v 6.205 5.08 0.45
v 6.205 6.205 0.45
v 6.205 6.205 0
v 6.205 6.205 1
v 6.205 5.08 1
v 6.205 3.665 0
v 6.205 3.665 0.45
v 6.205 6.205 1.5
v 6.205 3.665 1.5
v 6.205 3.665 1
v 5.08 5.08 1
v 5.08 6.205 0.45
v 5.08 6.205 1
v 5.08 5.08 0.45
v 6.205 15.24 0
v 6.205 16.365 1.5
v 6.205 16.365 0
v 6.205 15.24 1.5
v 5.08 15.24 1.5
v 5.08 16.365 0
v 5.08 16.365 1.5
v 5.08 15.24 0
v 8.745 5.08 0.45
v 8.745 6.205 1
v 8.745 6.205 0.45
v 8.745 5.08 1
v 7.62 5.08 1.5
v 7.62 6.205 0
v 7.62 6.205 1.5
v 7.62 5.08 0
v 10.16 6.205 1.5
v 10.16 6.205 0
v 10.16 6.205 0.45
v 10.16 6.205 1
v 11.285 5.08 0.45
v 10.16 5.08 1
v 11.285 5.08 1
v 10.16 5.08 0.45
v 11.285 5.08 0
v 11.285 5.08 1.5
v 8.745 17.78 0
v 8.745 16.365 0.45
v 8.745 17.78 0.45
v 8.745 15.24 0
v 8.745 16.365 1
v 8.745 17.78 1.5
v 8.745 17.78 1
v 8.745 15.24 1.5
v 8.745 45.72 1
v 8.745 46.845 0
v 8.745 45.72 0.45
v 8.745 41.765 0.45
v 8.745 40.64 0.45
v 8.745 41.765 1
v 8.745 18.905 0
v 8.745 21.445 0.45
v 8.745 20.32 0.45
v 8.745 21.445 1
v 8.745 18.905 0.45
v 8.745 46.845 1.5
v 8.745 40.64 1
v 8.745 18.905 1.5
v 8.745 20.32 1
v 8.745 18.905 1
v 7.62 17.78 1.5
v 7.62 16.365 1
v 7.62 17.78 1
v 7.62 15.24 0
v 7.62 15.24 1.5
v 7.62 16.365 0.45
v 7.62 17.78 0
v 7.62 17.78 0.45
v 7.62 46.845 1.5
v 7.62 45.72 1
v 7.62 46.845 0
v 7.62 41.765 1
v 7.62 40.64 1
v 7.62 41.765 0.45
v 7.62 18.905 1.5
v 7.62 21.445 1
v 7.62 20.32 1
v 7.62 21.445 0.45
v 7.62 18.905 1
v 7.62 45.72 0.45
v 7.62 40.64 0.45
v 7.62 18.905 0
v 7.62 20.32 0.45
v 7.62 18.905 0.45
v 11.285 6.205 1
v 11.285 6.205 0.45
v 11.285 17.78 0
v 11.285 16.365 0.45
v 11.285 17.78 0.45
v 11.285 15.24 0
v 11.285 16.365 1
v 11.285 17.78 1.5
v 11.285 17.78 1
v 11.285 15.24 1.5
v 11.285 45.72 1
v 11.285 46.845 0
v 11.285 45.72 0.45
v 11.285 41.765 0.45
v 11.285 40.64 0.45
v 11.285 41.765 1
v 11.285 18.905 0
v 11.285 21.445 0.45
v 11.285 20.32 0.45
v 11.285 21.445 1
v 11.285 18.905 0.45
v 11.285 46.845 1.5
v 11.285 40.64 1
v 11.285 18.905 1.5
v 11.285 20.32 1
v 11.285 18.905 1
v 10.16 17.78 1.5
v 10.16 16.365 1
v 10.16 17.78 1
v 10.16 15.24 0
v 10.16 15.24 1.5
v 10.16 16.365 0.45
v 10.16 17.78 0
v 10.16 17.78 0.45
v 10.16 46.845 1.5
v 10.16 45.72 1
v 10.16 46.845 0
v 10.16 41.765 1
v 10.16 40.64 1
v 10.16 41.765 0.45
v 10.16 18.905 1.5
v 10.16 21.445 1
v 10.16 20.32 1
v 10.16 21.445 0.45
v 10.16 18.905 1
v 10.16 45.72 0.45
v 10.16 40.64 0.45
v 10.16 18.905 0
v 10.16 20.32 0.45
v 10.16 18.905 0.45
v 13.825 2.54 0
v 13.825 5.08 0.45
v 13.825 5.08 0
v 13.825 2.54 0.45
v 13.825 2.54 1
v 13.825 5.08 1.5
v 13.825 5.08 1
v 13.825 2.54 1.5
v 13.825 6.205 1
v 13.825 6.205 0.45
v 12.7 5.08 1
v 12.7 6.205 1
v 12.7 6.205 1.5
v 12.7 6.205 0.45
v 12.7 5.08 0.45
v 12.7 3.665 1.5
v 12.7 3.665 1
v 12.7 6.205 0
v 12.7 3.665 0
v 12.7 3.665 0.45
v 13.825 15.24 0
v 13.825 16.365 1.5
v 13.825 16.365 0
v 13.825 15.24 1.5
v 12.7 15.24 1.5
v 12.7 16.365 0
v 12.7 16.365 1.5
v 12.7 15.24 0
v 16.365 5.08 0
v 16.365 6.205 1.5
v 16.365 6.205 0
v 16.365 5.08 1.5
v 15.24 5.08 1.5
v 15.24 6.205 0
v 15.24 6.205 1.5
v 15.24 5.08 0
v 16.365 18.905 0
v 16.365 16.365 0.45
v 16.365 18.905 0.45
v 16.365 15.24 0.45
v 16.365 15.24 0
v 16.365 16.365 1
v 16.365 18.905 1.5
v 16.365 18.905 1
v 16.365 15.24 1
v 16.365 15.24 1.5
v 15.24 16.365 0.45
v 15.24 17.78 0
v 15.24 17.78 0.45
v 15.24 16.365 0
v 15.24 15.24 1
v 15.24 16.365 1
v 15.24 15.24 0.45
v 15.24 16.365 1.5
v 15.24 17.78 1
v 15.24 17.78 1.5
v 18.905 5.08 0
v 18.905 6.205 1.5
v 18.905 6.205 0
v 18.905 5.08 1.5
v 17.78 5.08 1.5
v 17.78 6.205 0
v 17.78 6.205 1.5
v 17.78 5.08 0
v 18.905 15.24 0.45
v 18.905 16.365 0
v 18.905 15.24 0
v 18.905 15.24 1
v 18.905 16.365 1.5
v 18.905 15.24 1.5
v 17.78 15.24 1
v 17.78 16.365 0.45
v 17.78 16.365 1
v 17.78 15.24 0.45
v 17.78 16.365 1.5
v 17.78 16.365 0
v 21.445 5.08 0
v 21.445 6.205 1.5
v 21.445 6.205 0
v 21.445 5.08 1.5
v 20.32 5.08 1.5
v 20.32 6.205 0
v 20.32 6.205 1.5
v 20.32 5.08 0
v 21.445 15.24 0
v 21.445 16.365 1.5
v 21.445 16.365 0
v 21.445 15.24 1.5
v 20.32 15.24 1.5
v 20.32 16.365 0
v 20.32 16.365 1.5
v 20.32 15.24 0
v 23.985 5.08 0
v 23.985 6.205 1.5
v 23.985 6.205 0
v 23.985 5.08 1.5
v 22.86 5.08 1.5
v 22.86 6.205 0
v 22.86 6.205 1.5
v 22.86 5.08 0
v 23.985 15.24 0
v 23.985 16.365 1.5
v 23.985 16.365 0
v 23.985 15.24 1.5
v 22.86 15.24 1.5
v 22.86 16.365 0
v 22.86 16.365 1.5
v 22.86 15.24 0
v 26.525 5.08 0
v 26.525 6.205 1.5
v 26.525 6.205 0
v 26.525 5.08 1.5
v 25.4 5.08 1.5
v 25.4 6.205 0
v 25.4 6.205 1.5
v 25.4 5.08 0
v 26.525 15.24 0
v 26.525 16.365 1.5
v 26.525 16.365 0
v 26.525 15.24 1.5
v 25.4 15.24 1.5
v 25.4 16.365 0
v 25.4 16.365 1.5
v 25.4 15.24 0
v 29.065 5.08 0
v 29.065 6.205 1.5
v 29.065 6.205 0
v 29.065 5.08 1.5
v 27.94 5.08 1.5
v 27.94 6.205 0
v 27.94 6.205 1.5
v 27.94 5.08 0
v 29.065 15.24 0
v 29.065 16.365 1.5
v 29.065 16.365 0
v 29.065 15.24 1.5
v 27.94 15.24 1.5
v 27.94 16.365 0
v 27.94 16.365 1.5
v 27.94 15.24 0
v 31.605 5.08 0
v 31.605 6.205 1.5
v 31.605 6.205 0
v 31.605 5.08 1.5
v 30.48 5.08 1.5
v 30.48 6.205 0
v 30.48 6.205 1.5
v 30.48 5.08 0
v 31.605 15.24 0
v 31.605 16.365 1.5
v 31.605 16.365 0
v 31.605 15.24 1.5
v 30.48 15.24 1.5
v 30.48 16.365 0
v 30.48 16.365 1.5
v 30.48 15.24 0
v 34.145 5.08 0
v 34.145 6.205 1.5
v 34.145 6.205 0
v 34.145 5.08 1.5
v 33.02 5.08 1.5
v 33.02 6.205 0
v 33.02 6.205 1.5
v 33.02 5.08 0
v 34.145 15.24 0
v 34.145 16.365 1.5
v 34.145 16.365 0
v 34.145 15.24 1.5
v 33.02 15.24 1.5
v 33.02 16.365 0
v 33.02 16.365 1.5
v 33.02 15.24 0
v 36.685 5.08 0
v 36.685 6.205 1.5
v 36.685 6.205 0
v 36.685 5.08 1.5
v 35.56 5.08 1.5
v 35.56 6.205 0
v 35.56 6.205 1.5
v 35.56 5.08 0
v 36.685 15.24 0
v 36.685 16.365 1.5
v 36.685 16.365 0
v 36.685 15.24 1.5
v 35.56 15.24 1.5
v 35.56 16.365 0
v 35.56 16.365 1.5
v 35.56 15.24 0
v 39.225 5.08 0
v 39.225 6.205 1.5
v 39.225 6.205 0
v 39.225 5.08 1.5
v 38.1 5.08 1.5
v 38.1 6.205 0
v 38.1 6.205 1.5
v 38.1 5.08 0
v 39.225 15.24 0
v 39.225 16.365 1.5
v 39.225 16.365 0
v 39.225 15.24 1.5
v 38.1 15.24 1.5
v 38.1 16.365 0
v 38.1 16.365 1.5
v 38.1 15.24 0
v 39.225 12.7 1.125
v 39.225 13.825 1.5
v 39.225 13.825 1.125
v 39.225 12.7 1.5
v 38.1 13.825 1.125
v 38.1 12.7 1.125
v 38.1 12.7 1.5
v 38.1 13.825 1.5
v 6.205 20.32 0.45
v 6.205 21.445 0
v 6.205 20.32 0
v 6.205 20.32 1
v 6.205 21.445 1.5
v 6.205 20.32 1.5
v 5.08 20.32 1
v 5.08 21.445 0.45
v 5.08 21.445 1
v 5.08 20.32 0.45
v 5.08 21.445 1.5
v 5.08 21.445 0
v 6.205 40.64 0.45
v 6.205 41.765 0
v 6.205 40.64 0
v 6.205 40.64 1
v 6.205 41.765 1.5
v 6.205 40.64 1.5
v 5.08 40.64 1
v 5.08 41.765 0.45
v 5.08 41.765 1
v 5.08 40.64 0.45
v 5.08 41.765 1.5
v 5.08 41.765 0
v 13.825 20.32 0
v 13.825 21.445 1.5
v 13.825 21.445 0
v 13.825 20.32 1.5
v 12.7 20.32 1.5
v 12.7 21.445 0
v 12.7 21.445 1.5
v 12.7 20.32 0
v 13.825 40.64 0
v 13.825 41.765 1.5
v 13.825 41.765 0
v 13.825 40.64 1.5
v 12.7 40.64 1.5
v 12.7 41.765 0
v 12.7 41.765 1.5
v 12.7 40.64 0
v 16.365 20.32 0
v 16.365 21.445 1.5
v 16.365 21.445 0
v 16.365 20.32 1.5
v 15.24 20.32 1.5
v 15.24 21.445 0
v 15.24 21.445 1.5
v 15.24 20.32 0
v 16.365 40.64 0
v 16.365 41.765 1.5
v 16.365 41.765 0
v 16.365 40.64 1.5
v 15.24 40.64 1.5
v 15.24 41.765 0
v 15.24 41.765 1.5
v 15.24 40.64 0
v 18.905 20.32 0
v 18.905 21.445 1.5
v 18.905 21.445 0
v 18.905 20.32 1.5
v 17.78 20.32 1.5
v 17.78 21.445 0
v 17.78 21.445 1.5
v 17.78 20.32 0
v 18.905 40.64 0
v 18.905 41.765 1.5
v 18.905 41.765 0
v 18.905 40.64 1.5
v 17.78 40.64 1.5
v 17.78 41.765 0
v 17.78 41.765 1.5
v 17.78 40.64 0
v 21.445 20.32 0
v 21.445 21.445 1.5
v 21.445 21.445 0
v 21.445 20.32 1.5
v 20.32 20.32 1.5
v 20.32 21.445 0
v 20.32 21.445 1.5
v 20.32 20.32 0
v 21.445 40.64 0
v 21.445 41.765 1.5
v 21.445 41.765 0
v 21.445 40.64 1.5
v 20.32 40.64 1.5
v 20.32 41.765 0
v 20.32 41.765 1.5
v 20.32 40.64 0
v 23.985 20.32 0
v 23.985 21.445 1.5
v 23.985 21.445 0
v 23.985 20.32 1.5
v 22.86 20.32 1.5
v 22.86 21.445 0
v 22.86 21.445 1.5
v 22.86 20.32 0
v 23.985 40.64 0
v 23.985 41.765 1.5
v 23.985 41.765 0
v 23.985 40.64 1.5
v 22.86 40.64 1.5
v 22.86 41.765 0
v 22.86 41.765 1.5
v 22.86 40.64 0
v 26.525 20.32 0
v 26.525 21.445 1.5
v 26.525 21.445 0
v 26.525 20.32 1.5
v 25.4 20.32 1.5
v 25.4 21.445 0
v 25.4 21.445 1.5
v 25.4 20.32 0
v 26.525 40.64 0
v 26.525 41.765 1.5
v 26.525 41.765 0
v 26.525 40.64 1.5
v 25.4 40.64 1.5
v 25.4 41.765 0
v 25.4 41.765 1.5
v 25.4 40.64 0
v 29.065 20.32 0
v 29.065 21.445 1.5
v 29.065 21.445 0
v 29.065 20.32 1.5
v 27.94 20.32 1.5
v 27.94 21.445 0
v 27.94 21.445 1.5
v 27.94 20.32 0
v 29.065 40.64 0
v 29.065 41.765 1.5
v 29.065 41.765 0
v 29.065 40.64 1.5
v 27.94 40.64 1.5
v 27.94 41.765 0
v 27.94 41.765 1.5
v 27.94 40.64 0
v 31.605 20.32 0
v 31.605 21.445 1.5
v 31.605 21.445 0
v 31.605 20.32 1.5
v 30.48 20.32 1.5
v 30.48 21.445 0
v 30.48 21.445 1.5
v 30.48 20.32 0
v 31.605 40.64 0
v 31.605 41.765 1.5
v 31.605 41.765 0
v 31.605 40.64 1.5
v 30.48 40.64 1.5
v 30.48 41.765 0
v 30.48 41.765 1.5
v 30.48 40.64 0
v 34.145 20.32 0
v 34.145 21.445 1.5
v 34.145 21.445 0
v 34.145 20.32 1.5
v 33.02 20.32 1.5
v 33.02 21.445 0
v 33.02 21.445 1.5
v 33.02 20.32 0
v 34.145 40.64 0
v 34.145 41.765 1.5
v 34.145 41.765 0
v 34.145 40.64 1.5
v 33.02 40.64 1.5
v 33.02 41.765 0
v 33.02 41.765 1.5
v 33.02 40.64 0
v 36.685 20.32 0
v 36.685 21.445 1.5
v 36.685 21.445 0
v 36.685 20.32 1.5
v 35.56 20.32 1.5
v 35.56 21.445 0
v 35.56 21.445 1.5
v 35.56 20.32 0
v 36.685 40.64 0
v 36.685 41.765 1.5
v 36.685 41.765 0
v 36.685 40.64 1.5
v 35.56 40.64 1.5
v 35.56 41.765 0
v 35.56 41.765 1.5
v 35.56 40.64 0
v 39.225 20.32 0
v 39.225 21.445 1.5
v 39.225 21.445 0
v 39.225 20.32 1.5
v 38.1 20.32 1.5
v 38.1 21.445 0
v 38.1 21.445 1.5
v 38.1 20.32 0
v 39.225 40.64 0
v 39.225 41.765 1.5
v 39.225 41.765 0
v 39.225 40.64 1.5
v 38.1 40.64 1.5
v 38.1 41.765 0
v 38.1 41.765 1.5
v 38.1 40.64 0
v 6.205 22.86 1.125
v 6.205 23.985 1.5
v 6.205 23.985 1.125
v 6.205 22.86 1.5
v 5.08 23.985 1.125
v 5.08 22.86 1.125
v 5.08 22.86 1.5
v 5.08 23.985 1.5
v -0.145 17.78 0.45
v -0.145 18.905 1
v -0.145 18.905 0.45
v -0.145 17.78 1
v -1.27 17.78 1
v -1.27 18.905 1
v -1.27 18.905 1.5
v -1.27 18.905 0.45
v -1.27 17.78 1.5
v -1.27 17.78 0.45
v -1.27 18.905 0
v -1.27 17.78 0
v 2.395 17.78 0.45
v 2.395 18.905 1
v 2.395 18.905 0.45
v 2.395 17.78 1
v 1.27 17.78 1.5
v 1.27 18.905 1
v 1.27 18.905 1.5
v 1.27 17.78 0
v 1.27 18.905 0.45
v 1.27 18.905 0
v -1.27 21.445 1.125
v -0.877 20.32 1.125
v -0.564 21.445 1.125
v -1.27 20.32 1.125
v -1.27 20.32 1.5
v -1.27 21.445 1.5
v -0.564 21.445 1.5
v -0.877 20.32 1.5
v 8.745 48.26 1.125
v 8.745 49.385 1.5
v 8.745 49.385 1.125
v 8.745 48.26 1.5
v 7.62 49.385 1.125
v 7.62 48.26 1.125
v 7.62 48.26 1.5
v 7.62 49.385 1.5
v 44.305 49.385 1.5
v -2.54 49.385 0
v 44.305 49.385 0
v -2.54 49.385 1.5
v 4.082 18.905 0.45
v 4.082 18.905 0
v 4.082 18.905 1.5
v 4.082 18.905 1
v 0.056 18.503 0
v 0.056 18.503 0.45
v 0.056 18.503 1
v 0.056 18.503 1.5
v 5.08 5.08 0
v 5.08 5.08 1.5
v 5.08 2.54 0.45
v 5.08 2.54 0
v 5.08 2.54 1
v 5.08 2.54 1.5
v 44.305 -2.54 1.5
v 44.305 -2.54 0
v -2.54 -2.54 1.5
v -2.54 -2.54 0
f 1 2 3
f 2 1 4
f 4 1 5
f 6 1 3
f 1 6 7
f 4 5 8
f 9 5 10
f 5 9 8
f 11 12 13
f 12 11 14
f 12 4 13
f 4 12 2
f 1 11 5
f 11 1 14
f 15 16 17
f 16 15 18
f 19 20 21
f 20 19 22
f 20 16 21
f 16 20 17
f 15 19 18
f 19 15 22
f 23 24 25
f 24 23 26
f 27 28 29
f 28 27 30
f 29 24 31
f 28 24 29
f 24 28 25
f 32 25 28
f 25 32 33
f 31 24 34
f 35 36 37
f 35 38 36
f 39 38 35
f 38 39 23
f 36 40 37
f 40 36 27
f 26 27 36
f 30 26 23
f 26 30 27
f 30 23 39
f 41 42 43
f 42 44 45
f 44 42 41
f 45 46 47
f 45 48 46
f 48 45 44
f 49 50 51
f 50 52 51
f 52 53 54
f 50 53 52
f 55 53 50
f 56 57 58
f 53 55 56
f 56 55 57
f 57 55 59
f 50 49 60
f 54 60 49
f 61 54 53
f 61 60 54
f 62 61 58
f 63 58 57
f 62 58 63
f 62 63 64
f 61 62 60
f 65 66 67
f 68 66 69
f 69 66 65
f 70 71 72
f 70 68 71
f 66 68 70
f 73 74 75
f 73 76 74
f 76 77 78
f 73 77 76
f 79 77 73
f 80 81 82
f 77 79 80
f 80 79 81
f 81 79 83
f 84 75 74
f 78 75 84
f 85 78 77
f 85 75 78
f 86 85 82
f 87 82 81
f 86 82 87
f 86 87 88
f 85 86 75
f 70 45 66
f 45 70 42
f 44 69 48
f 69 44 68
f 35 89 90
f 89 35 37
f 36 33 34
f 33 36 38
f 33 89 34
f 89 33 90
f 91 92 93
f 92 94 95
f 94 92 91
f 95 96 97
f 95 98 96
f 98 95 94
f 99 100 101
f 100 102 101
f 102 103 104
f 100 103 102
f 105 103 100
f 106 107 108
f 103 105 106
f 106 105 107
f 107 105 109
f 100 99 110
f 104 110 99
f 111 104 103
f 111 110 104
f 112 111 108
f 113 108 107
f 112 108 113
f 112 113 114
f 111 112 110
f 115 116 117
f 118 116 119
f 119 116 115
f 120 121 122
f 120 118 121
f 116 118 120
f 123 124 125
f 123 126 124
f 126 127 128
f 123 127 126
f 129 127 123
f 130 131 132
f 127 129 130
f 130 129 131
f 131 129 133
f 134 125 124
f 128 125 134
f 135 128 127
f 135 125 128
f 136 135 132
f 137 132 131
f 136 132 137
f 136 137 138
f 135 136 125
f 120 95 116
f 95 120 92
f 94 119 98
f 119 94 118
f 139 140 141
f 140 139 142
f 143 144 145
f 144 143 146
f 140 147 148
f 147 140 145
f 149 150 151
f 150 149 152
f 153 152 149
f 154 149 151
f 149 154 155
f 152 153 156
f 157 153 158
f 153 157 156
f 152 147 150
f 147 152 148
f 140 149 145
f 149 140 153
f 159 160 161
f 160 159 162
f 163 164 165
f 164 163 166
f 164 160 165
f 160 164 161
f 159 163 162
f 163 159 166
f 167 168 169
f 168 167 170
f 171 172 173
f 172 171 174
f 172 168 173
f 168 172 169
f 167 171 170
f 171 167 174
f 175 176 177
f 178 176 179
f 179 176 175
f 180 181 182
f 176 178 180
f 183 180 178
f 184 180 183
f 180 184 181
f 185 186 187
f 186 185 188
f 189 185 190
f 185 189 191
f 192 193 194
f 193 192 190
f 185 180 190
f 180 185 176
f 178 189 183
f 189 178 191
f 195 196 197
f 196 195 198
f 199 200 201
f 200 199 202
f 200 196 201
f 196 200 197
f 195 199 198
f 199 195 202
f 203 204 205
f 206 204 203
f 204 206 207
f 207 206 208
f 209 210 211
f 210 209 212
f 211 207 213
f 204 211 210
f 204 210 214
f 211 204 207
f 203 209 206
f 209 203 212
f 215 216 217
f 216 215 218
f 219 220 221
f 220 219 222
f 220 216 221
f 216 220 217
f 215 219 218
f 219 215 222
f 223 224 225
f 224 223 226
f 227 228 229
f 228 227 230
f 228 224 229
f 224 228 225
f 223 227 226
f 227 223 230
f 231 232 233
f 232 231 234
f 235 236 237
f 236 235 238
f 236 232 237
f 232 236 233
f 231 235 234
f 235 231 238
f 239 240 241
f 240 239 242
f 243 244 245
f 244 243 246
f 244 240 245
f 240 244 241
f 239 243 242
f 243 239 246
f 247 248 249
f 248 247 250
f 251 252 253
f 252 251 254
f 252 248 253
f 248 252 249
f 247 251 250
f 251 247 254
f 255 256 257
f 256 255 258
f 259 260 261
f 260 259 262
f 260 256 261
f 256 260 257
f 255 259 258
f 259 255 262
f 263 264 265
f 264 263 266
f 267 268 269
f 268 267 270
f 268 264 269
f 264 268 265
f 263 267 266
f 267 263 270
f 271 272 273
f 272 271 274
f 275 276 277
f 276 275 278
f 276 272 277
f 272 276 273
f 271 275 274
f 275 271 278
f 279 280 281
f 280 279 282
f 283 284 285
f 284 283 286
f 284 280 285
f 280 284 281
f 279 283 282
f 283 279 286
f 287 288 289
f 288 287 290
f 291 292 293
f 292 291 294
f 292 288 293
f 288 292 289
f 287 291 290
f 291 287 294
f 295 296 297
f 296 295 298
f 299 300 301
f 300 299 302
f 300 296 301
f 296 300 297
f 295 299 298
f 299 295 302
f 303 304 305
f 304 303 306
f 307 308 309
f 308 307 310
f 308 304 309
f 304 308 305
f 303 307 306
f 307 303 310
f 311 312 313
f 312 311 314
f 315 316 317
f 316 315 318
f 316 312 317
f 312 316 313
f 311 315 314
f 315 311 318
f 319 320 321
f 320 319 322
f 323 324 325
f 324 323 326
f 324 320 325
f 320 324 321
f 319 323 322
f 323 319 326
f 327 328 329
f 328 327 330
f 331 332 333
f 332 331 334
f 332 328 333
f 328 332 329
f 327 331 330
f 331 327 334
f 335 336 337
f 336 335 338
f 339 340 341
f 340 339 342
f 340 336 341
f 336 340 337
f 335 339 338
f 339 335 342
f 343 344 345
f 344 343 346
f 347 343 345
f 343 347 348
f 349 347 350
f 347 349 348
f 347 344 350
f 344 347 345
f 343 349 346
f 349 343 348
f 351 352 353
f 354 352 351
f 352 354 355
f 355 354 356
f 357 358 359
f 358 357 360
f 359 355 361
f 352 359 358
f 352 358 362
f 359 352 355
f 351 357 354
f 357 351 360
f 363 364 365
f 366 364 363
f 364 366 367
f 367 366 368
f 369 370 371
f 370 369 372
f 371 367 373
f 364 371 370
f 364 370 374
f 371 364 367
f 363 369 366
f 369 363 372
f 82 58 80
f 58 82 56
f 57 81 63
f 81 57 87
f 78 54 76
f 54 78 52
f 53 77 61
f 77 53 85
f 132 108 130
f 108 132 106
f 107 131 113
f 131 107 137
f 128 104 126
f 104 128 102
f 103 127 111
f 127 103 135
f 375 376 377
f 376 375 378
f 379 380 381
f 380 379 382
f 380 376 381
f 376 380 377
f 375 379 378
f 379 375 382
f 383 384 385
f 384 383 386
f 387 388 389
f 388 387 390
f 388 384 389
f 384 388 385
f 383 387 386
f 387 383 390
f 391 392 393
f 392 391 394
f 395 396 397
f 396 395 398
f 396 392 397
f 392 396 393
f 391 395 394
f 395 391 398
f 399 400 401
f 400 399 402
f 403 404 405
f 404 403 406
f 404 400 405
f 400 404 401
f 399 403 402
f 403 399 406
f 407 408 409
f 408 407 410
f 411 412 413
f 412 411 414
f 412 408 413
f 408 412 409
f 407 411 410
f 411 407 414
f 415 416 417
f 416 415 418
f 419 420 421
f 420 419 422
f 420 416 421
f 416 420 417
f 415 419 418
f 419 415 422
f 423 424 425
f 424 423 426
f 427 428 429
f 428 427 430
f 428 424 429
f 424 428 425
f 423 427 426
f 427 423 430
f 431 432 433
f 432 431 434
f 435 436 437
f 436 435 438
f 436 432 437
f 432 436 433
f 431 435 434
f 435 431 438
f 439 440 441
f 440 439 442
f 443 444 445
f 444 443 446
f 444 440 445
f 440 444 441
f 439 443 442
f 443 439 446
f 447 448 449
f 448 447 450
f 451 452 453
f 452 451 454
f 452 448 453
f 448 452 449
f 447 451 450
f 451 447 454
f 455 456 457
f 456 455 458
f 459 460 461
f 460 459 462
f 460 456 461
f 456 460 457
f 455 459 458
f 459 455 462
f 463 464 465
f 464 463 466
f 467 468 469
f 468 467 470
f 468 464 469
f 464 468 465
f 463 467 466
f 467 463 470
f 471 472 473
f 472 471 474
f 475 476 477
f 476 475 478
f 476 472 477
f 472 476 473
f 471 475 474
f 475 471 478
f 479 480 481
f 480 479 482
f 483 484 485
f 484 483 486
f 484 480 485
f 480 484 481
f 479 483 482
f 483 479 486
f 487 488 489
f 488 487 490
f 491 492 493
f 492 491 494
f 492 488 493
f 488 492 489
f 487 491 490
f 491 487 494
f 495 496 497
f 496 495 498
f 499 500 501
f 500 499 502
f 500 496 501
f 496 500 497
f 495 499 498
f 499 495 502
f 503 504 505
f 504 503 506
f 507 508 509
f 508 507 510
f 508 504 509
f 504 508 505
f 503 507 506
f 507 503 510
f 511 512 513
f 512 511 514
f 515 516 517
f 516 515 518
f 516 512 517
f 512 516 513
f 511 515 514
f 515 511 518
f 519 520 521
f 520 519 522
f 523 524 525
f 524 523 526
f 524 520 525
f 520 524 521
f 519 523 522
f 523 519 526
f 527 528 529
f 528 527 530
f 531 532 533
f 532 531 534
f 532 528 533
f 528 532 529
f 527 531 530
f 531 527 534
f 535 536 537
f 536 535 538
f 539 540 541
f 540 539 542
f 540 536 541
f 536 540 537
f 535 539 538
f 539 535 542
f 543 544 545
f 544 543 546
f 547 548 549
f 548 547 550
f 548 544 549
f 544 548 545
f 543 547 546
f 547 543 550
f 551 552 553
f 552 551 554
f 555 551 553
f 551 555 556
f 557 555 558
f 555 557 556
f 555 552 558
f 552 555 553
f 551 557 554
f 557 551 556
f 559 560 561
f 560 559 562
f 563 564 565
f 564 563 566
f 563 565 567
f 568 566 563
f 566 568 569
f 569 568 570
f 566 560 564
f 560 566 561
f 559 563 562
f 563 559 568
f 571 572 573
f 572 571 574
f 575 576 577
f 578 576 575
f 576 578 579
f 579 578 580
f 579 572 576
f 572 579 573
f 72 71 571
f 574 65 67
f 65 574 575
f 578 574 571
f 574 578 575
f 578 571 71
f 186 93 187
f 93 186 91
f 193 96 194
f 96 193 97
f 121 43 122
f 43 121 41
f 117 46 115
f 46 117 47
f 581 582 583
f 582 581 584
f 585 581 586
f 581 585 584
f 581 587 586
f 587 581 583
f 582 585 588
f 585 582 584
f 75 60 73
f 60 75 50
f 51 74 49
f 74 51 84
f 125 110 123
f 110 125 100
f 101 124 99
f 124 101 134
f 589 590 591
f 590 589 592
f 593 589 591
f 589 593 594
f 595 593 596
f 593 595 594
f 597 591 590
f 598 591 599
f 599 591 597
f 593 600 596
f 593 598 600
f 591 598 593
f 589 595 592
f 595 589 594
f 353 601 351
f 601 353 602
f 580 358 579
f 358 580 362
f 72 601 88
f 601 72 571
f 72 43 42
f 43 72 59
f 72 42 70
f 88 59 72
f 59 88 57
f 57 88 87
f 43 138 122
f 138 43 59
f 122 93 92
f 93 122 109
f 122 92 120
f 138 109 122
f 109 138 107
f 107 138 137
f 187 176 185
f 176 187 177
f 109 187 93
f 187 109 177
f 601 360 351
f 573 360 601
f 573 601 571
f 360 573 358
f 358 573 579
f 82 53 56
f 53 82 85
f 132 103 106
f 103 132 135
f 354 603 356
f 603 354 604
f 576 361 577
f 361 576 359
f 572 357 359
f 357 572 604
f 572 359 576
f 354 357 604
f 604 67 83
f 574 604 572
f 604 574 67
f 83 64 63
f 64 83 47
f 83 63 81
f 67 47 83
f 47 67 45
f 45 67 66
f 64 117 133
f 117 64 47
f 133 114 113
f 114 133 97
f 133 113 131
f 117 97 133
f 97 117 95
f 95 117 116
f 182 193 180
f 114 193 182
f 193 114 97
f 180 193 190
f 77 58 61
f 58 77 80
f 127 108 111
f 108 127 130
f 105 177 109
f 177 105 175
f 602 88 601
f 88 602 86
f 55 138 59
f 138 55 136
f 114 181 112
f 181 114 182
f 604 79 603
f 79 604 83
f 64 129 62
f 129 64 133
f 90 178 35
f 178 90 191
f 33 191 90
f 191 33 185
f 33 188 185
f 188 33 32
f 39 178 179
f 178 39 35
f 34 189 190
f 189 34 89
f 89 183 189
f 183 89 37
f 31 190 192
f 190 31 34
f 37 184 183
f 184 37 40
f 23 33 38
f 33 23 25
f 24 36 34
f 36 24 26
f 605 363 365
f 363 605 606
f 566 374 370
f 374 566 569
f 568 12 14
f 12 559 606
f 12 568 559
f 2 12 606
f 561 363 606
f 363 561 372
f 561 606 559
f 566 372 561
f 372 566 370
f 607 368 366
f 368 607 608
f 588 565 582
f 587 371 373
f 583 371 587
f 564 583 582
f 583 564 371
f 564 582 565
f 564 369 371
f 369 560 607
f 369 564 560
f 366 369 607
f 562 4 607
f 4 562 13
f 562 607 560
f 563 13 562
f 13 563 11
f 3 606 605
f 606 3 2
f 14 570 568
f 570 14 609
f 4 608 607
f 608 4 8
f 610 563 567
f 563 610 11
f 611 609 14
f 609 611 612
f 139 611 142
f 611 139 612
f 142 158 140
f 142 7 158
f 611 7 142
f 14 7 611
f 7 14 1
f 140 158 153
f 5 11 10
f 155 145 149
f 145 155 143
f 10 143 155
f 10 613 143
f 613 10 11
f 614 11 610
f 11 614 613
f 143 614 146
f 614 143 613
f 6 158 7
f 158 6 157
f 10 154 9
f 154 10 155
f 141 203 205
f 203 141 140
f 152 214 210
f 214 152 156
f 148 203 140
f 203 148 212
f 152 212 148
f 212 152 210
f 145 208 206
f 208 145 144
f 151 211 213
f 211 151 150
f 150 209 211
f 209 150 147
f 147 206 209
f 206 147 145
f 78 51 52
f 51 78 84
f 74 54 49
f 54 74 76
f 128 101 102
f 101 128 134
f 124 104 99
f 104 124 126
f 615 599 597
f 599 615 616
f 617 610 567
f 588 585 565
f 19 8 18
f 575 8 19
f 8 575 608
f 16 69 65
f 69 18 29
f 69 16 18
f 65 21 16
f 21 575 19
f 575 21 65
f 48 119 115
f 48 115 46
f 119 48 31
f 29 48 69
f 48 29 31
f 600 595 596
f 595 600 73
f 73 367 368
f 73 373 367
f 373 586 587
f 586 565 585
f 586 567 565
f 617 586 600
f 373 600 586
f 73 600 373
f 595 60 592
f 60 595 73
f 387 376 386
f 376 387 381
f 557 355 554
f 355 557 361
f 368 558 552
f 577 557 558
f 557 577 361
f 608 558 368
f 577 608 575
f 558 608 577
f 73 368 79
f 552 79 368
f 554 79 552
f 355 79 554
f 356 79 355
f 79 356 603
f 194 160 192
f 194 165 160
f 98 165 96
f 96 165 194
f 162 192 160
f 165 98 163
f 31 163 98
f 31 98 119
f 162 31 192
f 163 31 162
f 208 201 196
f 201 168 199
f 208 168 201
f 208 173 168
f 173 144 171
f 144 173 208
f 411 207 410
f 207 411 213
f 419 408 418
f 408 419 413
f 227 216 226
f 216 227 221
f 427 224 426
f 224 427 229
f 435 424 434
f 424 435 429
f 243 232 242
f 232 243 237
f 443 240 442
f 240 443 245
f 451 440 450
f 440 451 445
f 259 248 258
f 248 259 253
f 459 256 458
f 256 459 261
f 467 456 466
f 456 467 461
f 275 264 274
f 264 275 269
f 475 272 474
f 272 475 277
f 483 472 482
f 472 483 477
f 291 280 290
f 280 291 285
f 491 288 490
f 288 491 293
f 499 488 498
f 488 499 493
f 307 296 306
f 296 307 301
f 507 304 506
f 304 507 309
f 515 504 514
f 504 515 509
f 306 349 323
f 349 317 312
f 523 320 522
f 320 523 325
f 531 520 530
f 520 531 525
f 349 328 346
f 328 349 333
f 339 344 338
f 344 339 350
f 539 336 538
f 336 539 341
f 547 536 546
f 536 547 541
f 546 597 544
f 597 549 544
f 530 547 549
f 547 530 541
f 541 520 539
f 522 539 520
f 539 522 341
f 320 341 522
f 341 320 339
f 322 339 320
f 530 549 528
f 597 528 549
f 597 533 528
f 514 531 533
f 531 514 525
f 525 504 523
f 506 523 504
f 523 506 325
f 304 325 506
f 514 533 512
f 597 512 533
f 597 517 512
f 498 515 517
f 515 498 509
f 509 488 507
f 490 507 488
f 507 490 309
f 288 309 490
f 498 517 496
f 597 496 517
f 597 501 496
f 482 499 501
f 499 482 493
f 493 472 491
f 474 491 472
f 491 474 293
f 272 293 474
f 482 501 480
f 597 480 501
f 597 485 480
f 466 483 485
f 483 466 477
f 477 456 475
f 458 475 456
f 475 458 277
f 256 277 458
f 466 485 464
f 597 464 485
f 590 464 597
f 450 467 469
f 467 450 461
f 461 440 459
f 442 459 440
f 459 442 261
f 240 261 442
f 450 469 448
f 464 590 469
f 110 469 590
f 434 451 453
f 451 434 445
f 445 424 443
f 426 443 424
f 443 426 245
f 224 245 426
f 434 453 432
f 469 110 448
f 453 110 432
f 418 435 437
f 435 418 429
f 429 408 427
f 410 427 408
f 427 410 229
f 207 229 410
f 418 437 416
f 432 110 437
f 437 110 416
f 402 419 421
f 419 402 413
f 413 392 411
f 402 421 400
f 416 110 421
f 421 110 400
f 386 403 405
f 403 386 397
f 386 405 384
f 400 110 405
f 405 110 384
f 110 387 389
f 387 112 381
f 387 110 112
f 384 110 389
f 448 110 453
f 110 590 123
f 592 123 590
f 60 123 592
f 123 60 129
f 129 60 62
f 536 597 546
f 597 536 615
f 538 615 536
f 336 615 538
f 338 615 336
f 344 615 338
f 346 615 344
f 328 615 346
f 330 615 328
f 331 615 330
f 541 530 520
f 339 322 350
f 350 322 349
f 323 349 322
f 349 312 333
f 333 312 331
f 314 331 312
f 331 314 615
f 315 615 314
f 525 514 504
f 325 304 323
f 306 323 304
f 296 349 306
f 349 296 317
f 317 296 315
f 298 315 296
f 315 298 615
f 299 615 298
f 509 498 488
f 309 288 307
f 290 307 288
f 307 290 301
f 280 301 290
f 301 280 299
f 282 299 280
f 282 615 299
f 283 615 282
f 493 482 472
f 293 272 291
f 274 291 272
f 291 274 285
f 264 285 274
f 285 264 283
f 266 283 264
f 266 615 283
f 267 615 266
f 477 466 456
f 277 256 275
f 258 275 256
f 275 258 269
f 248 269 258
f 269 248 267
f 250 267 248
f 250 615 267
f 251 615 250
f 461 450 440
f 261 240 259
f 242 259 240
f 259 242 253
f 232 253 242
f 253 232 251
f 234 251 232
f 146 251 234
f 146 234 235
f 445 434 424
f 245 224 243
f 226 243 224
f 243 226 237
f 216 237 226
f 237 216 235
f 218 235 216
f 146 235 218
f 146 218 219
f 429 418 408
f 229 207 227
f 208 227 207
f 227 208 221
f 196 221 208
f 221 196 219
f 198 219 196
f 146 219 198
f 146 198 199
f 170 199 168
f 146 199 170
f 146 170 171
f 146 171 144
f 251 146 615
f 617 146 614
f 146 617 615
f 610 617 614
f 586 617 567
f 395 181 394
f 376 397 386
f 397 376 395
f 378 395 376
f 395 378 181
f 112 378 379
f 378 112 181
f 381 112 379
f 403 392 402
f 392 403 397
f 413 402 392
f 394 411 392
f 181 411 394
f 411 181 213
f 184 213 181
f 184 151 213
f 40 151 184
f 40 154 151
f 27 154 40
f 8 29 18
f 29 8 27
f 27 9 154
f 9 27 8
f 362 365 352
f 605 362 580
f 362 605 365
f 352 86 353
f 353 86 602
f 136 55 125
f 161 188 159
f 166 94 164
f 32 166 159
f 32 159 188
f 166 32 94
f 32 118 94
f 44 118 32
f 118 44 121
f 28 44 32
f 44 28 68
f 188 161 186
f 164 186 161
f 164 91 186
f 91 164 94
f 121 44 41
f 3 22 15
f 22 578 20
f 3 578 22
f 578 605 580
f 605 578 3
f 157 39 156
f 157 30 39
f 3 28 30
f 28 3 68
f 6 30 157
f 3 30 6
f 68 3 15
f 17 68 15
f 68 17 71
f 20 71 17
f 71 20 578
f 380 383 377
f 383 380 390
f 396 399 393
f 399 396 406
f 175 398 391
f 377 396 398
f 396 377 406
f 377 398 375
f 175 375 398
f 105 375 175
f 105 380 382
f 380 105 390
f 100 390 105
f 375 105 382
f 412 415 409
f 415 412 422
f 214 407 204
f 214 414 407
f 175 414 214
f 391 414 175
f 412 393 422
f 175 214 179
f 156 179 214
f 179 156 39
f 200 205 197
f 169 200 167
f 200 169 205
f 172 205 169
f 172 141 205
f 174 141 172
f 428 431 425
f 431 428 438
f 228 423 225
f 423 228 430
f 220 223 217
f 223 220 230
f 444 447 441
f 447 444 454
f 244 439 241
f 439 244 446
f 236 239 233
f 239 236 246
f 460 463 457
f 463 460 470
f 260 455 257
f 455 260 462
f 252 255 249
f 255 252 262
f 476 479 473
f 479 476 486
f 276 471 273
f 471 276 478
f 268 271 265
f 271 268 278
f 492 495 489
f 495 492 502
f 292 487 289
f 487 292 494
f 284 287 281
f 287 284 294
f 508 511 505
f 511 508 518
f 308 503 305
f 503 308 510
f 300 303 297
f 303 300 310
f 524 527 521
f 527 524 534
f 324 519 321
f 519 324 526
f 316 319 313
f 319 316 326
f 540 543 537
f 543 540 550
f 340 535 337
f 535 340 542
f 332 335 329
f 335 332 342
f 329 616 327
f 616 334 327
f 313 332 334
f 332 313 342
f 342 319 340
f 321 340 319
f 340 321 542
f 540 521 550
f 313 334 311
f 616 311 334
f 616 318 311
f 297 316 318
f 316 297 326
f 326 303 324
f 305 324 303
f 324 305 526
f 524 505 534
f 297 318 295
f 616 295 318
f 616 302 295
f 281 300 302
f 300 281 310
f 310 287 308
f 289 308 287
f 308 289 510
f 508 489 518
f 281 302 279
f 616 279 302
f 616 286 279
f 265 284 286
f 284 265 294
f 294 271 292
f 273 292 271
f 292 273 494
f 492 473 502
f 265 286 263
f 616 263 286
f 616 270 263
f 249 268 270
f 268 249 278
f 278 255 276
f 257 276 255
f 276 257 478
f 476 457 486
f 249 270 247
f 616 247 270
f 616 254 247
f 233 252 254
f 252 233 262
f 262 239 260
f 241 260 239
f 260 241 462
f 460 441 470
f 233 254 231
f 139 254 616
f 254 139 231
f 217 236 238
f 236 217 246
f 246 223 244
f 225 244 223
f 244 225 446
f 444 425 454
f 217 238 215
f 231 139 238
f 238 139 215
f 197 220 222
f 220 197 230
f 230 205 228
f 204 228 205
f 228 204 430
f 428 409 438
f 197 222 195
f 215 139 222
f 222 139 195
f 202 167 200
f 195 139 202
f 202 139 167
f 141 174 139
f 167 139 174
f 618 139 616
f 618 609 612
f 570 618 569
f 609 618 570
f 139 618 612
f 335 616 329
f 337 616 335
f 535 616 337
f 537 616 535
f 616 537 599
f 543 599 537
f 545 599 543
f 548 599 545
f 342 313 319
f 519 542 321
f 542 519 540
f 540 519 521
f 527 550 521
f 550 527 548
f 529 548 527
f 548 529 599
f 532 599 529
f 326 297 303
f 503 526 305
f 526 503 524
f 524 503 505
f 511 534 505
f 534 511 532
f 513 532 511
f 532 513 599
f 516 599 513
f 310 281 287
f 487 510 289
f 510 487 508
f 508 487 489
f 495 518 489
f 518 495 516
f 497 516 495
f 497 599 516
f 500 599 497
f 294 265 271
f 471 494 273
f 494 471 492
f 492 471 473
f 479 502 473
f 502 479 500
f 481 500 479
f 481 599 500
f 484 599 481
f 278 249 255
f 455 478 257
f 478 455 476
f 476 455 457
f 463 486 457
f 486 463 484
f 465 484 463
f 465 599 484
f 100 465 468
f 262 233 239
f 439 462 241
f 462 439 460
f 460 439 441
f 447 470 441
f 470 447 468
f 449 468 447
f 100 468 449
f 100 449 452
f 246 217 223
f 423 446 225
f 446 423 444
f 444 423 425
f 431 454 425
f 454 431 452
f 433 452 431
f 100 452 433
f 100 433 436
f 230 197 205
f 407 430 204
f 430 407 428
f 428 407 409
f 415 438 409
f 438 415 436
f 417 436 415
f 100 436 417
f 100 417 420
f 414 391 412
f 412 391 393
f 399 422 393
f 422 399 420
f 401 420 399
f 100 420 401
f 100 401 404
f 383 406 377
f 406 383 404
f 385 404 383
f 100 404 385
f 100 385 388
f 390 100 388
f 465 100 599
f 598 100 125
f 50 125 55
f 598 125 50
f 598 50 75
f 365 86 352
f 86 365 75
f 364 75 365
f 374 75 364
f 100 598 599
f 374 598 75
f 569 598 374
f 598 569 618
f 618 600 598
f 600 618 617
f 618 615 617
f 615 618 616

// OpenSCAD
include <pcb.scad>
drillHoleRad = 2; 
holeDiam = 1.125; // thru hole diameter in mm
holeLenX = holeDiam;
holeLenY = holeDiam;
on = true;
 
// if two Wires in One Hole
//holeLenY = holeDiam + .9;
 
holeSpace=2.54; // thru hole spacing in mm
// Nore: .1 inch = .0254 centimeters
  
// thickness of the board 
materialThick = 1.5; //2.54; // mm
 
// depth of the troughs 
inset = materialThick *.5; 
deepInset = materialThick *.5; 

difference(){
createboard2(16, 18, "Green");    
    { 
    // reed diodes  controler  
    ic_row=2;
    ic_col=2;    
    ic(ic_row, ic_col, ic_row + 14, ic_col + 4, false);
    // led matrix controler
    ic(ic_row, ic_col + 6, ic_row + 14, ic_col + 14, true);
    // power coontroler
    con1_row = -0.5;
    con1_col = 7;
    ic(con1_row, con1_col, con1_row+2, con1_col, true); 
    // serial line
    line1_row = 3;
    line1_col = 18;
    ic(line1_row, line1_col, line1_row+2, line1_col, true); 
        
    //GRN
       underwire(con1_row + 1, con1_col, ic_row, ic_col + 6, neg, on);
       underwire(con1_row + 1, con1_col, ic_row + 4, con1_col, neg, on);
       underwire(ic_row + 4, con1_col, ic_row + 4, ic_col + 4, neg, on);
       underwire(ic_row + 4, ic_col + 4, ic_row + 2, ic_col , neg, on);
       underwire(ic_row + 2, ic_col, ic_row + 1, ic_col , neg, on);
    //POS
       underwire(con1_row , con1_col, ic_row, ic_col + 14, pos, on);
       underwire(con1_row , con1_col, ic_row, ic_col , pos, on);
       underwire(ic_row, ic_col, ic_row, ic_col-1, pos, on);
       underwire(ic_row, ic_col-1, ic_row+3, ic_col-1, pos, on);
       underwire(ic_row+3, ic_col-1, ic_row+3, ic_col, pos, on);
       underwire(ic_row+3, ic_col, ic_row+5, ic_col+4, pos, on);
     //serial
     underwire(line1_row, line1_col, ic_row+1, ic_col + 14, yellowled, on); // sda
     underwire(line1_row+1, line1_col, ic_row+2, ic_col + 14, trace, on); // scl
     underwire(ic_row+1, ic_col+14, ic_row+1, ic_col + 4, yellowled, on); // sda
     underwire(ic_row+2, ic_col+14, ic_row+2, ic_col + 4, trace, on); // scl
//     underwire(line1_row+1, line1_col, ic_row+2, ic_col + 14, trace, on); // scl
     
    }
} // difference 

//createboard3(16, 18, "Green");    
